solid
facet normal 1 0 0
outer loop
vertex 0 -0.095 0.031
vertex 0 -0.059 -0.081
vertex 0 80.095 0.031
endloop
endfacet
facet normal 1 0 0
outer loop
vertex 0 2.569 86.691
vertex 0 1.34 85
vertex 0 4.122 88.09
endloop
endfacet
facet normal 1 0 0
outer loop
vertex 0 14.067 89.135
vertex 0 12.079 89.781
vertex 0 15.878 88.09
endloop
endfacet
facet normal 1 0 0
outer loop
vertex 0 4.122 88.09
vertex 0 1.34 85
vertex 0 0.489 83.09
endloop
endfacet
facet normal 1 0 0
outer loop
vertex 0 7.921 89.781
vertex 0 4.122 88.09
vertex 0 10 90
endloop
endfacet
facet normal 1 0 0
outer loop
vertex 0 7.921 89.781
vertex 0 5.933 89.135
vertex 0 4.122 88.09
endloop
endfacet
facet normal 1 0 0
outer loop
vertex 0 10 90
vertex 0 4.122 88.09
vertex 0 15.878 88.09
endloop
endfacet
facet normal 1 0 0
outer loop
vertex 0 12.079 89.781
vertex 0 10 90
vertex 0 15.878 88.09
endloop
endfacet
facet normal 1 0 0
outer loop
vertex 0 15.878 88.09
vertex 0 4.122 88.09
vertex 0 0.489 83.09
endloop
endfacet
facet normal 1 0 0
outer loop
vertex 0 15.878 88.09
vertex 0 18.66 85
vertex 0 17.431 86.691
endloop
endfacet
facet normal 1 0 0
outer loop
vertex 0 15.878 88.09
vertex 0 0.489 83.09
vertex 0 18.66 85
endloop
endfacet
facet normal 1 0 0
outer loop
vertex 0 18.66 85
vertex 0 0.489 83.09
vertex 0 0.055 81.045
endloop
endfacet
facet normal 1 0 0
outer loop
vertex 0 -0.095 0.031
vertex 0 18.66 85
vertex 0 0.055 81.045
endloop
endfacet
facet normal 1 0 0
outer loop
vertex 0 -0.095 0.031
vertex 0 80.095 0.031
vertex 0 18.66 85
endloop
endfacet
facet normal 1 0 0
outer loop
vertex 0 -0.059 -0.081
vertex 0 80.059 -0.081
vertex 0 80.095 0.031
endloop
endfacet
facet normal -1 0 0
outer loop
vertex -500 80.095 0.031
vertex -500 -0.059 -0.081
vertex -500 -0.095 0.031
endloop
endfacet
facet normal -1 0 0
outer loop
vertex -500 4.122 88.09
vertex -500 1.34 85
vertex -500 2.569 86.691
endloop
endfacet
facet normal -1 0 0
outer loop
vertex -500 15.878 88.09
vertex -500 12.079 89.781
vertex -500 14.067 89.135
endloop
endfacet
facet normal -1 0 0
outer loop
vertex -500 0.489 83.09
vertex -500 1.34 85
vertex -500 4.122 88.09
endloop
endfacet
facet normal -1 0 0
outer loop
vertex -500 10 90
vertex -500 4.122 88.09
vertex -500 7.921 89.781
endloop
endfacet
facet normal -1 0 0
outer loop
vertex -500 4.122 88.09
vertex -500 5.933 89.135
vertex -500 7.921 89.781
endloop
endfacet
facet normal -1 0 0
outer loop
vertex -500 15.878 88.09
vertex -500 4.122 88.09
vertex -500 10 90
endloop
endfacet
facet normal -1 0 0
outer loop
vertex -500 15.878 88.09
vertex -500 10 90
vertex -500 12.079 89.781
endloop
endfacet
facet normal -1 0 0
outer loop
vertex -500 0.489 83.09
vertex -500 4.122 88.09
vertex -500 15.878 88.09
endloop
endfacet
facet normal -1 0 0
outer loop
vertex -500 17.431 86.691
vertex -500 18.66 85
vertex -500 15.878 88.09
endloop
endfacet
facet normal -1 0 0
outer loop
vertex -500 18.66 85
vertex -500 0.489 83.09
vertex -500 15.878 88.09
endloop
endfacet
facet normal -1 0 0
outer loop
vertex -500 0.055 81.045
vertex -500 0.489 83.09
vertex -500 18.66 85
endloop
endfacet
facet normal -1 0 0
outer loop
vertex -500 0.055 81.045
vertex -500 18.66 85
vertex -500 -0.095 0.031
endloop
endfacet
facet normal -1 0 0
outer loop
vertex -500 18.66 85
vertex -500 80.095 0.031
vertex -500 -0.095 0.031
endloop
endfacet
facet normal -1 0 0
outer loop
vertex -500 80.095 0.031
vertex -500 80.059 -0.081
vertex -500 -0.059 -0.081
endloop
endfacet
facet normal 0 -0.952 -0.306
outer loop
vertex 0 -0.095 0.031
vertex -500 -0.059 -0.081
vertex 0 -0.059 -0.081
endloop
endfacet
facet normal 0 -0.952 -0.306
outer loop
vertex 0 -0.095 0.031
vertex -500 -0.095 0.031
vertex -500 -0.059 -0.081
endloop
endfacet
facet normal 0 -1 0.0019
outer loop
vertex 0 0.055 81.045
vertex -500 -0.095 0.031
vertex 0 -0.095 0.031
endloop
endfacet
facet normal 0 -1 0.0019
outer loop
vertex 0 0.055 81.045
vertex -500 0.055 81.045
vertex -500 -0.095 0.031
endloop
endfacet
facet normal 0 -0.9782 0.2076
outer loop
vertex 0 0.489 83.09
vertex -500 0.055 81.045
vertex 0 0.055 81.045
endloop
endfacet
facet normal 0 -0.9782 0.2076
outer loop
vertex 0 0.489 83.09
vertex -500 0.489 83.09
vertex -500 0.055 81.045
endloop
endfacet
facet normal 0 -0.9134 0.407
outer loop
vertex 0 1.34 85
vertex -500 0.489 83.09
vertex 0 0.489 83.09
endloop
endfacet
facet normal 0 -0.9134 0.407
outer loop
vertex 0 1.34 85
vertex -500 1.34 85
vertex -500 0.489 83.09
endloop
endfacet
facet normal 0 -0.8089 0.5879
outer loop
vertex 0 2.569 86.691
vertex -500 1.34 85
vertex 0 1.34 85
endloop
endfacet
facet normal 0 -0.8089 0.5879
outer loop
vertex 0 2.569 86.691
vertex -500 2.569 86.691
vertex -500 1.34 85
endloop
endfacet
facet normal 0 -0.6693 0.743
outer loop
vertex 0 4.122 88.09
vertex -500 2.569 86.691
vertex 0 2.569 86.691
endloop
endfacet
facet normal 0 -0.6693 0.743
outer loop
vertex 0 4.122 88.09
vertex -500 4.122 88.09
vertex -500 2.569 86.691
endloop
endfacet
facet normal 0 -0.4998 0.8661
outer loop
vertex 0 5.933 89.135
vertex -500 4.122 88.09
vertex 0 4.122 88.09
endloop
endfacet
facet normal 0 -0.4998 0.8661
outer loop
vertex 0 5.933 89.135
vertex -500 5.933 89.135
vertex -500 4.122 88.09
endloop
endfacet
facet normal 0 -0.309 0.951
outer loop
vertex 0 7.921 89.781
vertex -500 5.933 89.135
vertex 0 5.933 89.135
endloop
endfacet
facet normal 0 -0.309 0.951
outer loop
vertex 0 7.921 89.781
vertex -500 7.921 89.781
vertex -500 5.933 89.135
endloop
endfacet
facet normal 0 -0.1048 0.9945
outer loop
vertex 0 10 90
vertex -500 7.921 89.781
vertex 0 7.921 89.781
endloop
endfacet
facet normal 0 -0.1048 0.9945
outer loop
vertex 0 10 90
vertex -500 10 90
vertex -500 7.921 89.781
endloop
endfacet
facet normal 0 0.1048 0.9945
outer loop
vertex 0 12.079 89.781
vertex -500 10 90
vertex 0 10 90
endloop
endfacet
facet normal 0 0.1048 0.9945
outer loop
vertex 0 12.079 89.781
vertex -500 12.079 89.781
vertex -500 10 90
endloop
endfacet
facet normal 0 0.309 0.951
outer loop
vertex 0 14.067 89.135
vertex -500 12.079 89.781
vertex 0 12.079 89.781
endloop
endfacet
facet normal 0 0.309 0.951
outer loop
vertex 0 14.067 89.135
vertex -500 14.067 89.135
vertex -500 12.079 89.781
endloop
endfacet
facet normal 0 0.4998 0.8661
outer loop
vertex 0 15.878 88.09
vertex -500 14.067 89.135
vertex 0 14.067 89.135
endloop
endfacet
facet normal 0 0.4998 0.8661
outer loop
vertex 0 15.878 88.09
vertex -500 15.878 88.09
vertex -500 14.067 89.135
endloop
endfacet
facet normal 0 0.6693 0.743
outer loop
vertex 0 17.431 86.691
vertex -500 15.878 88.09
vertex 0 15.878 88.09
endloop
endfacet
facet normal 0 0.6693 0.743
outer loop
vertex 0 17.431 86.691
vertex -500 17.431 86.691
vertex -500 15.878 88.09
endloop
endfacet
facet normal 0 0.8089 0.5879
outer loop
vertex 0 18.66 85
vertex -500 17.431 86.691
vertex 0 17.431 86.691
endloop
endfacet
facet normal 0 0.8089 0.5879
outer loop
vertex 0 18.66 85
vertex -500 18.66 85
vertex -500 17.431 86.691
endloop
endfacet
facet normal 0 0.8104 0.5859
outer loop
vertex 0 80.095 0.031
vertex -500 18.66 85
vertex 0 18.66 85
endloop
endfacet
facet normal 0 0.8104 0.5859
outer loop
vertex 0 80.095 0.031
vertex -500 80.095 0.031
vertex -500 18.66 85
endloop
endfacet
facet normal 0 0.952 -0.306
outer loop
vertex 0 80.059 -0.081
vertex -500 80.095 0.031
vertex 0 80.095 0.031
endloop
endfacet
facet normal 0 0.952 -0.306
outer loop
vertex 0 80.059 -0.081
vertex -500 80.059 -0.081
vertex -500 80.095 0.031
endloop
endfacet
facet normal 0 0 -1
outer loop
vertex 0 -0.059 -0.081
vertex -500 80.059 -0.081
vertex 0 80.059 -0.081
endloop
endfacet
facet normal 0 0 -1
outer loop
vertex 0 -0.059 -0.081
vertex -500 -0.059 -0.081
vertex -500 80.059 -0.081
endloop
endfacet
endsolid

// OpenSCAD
// Customizable Triangle with Two Rounded Corners
// Parameters you can adjust
side_length = 100;  // Length of each side of the triangle
corner_radius = 10; // Radius of rounded corners
thickness = 500;      // Thickness of the triangle

module custom_triangle() {
    // Create a triangle with two rounded corners and one sharp corner
    difference() {
        // Base triangle hull with rounded corners
        hull() {
            // Calculate points of an equilateral triangle
            angle = 60;
            p1 = [0, 0];  // Sharp corner
            p2 = [side_length, 0];  // Rounded corner
            p3 = [side_length/2, side_length * sin(angle)];  // Rounded corner
            
            // Create circles at two corners with specified radius
            translate(p2) circle(r=corner_radius);
            translate(p3) circle(r=corner_radius);
        }
        
        // Remove a small circle at the sharp corner to ensure it stays sharp
        translate([0, 0]) circle(r=0.1);
    }
}

module right_triangle(side1,side2,corner_radius){
        hull(){  
            circle(0.1);
            translate([side1 - corner_radius * 2, corner_radius,0])
                circle(corner_radius);
            translate([0,side2 - corner_radius * 2,0])
                circle(0.1);  
        }
}

rotate([0,-90,0]){
    linear_extrude(height = thickness) {  
        right_triangle(side_length,side_length,corner_radius);
    }
}
